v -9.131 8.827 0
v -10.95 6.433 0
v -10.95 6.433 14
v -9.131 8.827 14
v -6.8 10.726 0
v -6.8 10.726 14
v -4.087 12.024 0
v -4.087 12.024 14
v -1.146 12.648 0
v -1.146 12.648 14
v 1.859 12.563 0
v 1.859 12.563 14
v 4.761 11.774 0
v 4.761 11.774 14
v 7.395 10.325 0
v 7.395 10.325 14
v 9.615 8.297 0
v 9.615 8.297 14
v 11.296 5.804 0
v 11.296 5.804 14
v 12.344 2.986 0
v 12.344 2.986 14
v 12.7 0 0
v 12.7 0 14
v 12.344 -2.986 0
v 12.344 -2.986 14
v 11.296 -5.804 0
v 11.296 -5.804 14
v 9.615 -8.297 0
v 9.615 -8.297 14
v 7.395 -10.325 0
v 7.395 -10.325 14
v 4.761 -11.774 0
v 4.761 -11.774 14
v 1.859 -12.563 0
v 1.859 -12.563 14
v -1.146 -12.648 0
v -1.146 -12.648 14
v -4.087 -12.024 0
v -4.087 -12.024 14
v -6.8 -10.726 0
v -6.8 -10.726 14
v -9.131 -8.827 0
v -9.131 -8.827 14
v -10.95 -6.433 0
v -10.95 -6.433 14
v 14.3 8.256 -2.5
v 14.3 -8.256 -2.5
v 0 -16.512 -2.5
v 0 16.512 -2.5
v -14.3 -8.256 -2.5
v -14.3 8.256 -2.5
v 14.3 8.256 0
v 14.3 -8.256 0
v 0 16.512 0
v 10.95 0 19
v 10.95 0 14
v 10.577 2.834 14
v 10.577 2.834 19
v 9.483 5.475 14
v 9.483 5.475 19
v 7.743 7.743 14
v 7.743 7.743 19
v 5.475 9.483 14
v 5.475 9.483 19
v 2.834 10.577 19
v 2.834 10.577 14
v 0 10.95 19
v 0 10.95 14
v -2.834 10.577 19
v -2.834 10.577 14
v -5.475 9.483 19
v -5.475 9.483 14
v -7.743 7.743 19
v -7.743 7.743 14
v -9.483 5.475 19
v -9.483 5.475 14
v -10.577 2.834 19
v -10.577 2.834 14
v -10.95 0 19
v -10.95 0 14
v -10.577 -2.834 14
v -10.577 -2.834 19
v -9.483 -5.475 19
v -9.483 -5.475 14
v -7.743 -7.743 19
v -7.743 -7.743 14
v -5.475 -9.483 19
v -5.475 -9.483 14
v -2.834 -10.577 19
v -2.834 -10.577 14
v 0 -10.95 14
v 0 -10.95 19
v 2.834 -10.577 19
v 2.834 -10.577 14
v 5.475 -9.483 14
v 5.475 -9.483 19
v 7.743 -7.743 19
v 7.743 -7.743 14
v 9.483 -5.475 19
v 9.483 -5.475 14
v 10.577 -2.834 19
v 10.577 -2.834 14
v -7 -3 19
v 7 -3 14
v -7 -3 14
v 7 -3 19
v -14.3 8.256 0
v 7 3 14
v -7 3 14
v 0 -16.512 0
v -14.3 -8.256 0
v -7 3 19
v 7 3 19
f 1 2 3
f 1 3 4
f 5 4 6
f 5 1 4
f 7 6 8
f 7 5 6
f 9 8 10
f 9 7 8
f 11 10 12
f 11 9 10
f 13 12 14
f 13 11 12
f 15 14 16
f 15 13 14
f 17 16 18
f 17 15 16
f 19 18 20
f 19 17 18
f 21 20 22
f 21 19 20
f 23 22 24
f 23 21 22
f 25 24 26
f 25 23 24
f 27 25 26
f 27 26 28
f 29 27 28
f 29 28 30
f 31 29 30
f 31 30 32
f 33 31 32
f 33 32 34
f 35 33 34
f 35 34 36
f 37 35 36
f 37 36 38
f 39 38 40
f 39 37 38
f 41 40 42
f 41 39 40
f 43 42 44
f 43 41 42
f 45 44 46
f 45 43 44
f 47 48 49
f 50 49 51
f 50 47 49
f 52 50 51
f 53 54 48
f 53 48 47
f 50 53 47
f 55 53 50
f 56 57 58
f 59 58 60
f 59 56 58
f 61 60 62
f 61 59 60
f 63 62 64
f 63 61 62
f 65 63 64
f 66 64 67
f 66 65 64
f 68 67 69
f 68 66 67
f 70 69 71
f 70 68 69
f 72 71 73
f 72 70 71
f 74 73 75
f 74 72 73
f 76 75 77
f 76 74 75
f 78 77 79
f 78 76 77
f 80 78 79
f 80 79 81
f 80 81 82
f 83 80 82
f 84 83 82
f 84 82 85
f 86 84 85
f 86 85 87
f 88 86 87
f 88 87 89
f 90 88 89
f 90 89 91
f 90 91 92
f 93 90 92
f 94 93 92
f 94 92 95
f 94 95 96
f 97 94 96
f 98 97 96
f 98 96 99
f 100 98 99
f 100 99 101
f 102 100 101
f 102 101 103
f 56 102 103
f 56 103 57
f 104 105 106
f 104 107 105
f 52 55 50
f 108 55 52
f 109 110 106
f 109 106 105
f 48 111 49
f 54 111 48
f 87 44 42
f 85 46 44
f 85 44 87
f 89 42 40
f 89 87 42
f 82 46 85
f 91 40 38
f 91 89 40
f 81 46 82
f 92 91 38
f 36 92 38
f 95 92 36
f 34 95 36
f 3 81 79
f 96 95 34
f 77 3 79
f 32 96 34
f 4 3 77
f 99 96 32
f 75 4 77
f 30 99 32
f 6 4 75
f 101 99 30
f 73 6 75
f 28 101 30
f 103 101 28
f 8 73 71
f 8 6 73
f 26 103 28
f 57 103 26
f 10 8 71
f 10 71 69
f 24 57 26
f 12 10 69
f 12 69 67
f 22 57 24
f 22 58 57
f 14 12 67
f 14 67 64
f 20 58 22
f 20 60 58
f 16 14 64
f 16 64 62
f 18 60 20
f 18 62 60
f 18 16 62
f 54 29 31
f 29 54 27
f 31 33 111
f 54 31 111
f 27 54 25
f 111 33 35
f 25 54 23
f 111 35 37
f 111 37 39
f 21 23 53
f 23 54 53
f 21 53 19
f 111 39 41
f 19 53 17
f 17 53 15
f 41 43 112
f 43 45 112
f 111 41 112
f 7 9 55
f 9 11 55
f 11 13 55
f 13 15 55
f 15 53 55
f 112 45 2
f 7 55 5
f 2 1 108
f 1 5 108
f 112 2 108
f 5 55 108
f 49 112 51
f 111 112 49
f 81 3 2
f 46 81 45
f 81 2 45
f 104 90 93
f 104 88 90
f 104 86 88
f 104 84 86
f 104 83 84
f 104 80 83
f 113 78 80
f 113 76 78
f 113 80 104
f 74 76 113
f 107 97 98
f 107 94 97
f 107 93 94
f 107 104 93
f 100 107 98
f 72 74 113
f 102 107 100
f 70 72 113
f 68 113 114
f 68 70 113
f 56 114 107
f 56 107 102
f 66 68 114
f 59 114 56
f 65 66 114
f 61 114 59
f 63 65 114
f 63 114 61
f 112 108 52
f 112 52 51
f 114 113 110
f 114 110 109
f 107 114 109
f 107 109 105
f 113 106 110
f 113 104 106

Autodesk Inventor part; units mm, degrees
ref_plane "YZ Plane" through (0, 0, 0) normal (1, 0, 0) x (0, 1, 0)
ref_plane "XZ Plane" through (0, 0, 0) normal (0, 1, 0) x (-1, 0, 0)
ref_plane "XY Plane" through (0, 0, 0) normal (0, 0, 1) x (1, 0, 0)
sketch "Sketch1" plane through (0, 0, 0) normal (0, 0, 1) x (1, 0, 0)
  circle A0 centre (0, 0) radius 12.7
  line L0 (-10.95, 6.4333) -> (-10.95, -6.4333)
  dimension "d0" = 25.4
  dimension "d1" = 23.65
extrude "Extrusion1" add sketch "Sketch1" along normal blind 19 contours A0 L0 picked at (-3.0667, 0)
sketch "Sketch2" plane through (0, 0, 0) normal (0, 0, -1) x (-1, 0, 0)
  line L0 (0, 16.5122) -> (14.3, 8.2561)
  line L1 (14.3, 8.2561) -> (14.3, -8.2561)
  line L2 (14.3, -8.2561) -> (0, -16.5122)
  line L3 (0, -16.5122) -> (-14.3, -8.2561)
  line L4 (-14.3, -8.2561) -> (-14.3, 8.2561)
  line L5 (-14.3, 8.2561) -> (0, 16.5122)
  point P0 (0, 0)
  point P1 (0, 0)
  dimension "d5" = 28.6
extrude "Extrusion2" add sketch "Sketch2" along normal blind 2.5
sketch "Sketch3" plane through (0, 0, 19) normal (0, 0, 1) x (1, 0, 0)
  circle A0 centre (0, 0) radius 10.95
  arc A1 (-10.95, -6.4333) -> (-10.95, 6.4333) centre (0, 0) ccw projected
  line L0 (-10.95, 6.4333) -> (-10.95, -6.4333) projected
  point P0 (-10.95, 0)
extrude "Extrusion3" cut sketch "Sketch3" against normal blind 5
sketch "Sketch4" plane through (0, 0, 19) normal (0, 0, 1) x (1, 0, 0)
  line L0 (-7, 3) -> (7, 3)
  line L1 (7, 3) -> (7, -3)
  line L2 (7, -3) -> (-7, -3)
  line L3 (-7, -3) -> (-7, 3)
  point P0 (0, 0)
  point P1 (7, 0)
  point P2 (0, 3)
  dimension "d10" = 14
  dimension "d11" = 6
extrude "Extrusion4" cut sketch "Sketch4" against normal blind 5
thread "Thread1" size "1-20 UNEF" class "2A" standard "ANSI Unified Screw Threads" full length
properties part number "RS PRO USB 2.0 Cable, Female USB A to Male USB A USB Extension Cable, 200mm"
